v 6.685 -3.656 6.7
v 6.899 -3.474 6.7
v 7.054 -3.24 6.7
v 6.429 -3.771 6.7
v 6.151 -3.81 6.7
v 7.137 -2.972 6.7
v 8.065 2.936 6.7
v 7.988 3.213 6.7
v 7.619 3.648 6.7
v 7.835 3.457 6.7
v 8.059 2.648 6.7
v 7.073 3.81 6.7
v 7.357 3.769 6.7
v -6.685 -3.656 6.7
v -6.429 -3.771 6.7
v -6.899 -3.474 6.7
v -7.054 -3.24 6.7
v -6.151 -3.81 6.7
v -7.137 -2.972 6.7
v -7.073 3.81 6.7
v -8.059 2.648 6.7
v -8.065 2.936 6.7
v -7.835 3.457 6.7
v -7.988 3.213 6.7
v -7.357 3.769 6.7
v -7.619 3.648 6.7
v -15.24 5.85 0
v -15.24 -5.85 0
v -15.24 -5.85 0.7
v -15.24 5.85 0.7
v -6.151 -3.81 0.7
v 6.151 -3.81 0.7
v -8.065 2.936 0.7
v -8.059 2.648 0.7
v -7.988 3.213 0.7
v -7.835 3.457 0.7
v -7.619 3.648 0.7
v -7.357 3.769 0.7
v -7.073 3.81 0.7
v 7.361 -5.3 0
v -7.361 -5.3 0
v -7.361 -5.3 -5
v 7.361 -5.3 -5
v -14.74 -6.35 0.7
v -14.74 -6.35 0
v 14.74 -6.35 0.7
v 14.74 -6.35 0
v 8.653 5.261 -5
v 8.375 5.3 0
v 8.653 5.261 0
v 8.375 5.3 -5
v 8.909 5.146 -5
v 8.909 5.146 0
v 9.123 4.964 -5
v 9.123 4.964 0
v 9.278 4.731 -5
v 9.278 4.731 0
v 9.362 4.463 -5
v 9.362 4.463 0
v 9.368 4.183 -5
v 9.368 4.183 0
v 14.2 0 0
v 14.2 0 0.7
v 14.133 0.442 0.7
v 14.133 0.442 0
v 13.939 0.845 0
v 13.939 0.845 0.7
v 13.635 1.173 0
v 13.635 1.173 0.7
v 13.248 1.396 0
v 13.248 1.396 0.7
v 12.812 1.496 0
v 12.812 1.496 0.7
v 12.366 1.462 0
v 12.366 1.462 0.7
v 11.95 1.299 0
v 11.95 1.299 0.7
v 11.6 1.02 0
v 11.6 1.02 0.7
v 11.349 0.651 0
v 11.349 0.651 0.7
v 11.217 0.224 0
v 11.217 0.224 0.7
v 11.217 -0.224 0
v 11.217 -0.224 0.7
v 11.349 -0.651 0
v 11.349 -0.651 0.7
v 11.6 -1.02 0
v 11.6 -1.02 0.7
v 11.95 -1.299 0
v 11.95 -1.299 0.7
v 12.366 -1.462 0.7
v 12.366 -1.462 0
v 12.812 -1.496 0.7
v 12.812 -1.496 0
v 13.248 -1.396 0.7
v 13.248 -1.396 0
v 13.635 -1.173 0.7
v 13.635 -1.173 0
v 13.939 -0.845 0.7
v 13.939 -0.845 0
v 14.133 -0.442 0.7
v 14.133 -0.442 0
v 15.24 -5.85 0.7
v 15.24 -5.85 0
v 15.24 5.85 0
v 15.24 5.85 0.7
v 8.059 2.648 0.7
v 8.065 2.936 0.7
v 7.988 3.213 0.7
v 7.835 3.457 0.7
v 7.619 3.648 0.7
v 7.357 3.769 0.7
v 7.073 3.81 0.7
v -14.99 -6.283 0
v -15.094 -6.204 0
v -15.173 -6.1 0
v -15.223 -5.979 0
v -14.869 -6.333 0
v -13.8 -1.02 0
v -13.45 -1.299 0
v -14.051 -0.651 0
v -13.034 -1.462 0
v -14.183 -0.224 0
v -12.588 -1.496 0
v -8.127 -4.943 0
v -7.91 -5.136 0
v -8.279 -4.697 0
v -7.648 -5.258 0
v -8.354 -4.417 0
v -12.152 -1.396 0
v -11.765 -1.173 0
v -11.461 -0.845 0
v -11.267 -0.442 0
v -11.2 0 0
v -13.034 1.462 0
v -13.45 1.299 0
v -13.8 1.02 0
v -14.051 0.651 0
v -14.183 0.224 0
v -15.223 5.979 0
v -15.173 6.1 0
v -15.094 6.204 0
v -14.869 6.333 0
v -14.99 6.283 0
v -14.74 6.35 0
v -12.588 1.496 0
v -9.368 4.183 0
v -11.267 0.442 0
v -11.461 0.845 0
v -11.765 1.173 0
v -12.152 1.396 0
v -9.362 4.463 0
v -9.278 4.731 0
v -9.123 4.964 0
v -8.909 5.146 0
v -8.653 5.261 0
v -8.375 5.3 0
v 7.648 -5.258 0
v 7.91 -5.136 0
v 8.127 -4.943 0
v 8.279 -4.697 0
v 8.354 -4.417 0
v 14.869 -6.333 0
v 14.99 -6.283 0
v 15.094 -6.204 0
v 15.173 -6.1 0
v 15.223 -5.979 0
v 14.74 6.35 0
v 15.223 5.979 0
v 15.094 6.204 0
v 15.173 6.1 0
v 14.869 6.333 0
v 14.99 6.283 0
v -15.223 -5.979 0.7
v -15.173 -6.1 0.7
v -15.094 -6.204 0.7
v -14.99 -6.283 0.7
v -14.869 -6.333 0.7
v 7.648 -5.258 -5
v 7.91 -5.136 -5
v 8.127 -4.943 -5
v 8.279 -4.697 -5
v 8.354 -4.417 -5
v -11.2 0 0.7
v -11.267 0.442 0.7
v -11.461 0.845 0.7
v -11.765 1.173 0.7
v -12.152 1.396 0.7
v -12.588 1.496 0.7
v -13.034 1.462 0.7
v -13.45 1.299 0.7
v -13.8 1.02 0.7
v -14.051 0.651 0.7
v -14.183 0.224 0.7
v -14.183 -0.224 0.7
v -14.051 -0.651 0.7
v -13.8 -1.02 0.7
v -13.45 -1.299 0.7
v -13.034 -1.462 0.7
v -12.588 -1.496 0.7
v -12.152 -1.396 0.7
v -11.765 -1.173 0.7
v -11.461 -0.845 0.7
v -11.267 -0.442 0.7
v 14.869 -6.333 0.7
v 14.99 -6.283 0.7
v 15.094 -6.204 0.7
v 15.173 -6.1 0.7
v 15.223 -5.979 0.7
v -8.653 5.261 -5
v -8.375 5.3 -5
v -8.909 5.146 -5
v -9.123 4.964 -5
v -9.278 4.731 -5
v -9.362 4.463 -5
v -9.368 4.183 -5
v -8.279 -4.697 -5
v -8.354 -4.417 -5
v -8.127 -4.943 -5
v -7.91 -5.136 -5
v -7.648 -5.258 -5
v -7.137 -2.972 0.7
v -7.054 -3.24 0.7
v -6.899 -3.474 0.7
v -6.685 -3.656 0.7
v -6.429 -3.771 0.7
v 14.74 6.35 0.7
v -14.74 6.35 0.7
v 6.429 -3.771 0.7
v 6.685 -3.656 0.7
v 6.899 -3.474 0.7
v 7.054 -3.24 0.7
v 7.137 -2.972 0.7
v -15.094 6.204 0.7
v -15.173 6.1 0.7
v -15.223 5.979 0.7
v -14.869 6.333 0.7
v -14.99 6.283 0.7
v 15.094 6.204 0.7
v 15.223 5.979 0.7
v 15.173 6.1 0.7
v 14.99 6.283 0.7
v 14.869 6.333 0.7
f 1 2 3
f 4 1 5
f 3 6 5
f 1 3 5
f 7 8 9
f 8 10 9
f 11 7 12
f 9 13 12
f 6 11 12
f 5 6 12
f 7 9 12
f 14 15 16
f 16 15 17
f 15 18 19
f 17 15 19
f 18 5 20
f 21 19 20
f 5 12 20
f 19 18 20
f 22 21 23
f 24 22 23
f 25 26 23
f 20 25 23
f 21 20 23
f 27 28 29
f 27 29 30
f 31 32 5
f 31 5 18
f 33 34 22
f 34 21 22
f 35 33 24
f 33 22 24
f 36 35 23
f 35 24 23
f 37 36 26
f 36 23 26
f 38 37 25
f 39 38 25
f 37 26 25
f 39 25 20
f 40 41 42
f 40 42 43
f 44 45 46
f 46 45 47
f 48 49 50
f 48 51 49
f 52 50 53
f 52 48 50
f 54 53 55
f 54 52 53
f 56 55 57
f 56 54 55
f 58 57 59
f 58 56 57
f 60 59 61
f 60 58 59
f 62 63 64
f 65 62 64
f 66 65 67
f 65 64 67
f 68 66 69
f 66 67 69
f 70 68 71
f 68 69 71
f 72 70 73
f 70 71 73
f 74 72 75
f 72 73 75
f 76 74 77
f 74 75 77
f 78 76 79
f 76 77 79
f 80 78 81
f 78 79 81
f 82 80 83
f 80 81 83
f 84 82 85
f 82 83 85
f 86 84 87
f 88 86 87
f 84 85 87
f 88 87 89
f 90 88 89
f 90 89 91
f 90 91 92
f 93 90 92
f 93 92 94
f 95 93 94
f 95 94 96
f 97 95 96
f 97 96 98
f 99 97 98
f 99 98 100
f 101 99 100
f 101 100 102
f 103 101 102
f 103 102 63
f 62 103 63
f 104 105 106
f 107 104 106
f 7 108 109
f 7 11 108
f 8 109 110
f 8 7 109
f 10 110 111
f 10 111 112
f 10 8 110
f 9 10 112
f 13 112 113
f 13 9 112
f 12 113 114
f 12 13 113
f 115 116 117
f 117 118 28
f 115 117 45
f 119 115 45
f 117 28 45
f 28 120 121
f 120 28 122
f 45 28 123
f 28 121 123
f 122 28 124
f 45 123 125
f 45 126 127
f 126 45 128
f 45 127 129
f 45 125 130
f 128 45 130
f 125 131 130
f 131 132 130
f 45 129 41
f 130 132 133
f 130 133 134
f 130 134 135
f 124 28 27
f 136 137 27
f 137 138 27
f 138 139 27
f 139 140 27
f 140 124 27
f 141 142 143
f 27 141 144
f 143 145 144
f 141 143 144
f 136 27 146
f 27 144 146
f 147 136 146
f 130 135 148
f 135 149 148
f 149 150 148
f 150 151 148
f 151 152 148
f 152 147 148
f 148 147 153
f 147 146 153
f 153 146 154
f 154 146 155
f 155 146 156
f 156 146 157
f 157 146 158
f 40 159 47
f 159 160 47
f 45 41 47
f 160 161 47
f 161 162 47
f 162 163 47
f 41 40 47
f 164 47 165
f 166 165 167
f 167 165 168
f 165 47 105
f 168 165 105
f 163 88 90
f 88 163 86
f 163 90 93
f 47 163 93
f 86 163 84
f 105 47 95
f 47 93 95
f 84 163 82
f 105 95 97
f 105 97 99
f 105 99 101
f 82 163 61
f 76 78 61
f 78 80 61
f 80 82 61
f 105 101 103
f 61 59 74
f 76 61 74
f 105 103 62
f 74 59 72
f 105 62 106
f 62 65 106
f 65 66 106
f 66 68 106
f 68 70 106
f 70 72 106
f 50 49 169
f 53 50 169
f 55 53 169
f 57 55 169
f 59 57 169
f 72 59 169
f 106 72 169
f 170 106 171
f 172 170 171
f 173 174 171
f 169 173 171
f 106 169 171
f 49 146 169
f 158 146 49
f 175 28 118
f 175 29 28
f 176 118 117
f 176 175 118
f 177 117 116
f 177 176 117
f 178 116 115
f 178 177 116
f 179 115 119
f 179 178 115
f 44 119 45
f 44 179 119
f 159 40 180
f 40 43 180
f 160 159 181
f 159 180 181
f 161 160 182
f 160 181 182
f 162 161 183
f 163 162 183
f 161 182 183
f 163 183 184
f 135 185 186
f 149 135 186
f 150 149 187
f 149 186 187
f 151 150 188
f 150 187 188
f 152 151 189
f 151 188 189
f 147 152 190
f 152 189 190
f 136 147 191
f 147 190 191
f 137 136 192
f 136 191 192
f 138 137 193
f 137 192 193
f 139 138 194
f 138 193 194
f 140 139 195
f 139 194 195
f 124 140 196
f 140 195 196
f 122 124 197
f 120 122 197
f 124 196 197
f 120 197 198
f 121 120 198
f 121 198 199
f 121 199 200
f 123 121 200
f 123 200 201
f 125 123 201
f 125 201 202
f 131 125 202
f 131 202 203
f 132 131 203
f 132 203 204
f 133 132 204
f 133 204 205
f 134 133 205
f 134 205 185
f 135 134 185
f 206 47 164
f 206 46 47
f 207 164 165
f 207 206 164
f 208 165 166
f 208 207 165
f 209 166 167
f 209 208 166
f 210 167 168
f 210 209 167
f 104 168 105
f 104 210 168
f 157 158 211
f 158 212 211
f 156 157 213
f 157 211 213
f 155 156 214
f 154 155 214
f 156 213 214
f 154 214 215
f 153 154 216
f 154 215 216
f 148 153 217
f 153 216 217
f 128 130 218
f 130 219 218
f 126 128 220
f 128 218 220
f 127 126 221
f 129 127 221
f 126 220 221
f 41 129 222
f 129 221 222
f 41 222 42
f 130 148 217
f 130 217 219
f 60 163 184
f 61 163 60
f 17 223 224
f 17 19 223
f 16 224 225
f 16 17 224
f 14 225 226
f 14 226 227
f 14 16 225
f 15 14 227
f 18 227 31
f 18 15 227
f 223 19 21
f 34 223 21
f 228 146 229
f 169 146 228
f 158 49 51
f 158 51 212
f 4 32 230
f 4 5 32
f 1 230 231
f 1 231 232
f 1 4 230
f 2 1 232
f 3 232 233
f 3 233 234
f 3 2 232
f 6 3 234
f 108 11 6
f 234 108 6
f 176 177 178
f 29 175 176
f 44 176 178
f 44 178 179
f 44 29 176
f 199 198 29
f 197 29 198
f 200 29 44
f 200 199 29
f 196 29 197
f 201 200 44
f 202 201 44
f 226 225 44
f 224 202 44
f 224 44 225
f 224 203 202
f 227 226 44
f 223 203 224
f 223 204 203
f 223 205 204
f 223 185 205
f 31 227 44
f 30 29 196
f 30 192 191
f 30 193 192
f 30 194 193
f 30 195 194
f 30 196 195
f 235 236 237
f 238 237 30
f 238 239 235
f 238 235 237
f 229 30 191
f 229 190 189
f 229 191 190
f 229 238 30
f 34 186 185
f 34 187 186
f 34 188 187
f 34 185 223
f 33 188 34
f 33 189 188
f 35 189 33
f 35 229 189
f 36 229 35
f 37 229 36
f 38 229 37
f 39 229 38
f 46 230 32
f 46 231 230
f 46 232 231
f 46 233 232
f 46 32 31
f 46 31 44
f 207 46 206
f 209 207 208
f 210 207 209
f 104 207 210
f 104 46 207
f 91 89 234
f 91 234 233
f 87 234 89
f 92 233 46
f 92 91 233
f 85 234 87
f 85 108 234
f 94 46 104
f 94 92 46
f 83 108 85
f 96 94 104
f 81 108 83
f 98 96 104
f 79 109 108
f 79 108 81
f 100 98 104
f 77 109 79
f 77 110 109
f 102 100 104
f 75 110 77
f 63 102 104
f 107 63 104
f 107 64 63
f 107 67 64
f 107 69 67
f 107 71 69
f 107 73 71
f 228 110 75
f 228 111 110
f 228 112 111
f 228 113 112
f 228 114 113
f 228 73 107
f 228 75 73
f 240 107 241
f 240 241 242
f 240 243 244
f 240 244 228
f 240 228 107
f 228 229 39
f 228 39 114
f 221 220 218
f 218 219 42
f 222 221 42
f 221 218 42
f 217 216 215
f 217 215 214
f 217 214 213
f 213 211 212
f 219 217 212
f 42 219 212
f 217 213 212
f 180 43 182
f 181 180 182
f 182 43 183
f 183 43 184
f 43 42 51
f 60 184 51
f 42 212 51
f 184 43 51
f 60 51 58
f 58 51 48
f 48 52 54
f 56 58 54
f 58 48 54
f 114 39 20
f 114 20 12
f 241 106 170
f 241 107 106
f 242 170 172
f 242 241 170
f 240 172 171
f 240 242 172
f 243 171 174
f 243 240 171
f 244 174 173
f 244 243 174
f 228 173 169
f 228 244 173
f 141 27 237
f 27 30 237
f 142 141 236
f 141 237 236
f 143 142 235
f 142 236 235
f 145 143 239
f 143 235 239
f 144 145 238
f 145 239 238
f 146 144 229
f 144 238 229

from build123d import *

# Parameters (mm, degrees)
ESQUISSE1_W             = 30.48
ESQUISSE1_H             = 12.7
BOSS_EXTRU_1_DEPTH      = 0.7
CONG_1_R                = 0.5
ESQUISSE2_R             = 1.5
ENL_V_MAT_EXTRU_1_DEPTH = 1.7
BOSS_EXTRU_2_DEPTH      = 6
CONG_2_R                = 1
BOSS_EXTRU_3_DEPTH      = 5
CONG_3_R                = 1


with BuildPart() as part:
    # Esquisse1 → Boss.-Extru.1 (new body)
    with BuildSketch(Plane.XY):
        Rectangle(ESQUISSE1_W, ESQUISSE1_H)
    extrude(amount=BOSS_EXTRU_1_DEPTH)

    # Congé1
    cong_1_edges = [part.edges().sort_by_distance(p)[0] for p in [
        (-15.24, 6.35, 0.35),
        (15.24, 6.35, 0.35),
        (15.24, -6.35, 0.35),
        (-15.24, -6.35, 0.35),
    ]]
    fillet(cong_1_edges, radius=CONG_1_R)

    # Esquisse2 → Enlèv. mat.-Extru.1 (cut, through all)
    with BuildSketch(Plane.XY.offset(0.7)):
        with Locations((-12.7, 0)):
            Circle(ESQUISSE2_R)
        with Locations((12.7, 0)):
            Circle(ESQUISSE2_R)
    extrude(amount=-ENL_V_MAT_EXTRU_1_DEPTH, mode=Mode.SUBTRACT)

    # Esquisse3 → Boss.-Extru.2 (add)
    with BuildSketch(Plane.XY.offset(0.7)):
        Polygon((-8.25, 3.81), (8.25, 3.81), (7, -3.81), (-7, -3.81), align=None)
    extrude(amount=BOSS_EXTRU_2_DEPTH)

    # Congé2
    cong_2_edges = [part.edges().sort_by_distance(p)[0] for p in [
        (-8.25, 3.81, 3.7),
        (-7, -3.81, 3.7),
        (7, -3.81, 3.7),
        (8.25, 3.81, 3.7),
    ]]
    fillet(cong_2_edges, radius=CONG_2_R)

    # Esquisse4 → Boss.-Extru.3 (add)
    with BuildSketch(Plane(origin=(0, 0, 0), x_dir=(-1, 0, 0), z_dir=(0, 0, -1))):
        Polygon((-9.5, 5.3), (9.5, 5.3), (8.25, -5.3), (-8.25, -5.3), align=None)
    extrude(amount=BOSS_EXTRU_3_DEPTH)

    # Congé3
    cong_3_edges = [part.edges().sort_by_distance(p)[0] for p in [
        (9.5, 5.3, -2.5),
        (8.25, -5.3, -2.5),
        (-8.25, -5.3, -2.5),
        (-9.5, 5.3, -2.5),
    ]]
    fillet(cong_3_edges, radius=CONG_3_R)


solid = part.part
